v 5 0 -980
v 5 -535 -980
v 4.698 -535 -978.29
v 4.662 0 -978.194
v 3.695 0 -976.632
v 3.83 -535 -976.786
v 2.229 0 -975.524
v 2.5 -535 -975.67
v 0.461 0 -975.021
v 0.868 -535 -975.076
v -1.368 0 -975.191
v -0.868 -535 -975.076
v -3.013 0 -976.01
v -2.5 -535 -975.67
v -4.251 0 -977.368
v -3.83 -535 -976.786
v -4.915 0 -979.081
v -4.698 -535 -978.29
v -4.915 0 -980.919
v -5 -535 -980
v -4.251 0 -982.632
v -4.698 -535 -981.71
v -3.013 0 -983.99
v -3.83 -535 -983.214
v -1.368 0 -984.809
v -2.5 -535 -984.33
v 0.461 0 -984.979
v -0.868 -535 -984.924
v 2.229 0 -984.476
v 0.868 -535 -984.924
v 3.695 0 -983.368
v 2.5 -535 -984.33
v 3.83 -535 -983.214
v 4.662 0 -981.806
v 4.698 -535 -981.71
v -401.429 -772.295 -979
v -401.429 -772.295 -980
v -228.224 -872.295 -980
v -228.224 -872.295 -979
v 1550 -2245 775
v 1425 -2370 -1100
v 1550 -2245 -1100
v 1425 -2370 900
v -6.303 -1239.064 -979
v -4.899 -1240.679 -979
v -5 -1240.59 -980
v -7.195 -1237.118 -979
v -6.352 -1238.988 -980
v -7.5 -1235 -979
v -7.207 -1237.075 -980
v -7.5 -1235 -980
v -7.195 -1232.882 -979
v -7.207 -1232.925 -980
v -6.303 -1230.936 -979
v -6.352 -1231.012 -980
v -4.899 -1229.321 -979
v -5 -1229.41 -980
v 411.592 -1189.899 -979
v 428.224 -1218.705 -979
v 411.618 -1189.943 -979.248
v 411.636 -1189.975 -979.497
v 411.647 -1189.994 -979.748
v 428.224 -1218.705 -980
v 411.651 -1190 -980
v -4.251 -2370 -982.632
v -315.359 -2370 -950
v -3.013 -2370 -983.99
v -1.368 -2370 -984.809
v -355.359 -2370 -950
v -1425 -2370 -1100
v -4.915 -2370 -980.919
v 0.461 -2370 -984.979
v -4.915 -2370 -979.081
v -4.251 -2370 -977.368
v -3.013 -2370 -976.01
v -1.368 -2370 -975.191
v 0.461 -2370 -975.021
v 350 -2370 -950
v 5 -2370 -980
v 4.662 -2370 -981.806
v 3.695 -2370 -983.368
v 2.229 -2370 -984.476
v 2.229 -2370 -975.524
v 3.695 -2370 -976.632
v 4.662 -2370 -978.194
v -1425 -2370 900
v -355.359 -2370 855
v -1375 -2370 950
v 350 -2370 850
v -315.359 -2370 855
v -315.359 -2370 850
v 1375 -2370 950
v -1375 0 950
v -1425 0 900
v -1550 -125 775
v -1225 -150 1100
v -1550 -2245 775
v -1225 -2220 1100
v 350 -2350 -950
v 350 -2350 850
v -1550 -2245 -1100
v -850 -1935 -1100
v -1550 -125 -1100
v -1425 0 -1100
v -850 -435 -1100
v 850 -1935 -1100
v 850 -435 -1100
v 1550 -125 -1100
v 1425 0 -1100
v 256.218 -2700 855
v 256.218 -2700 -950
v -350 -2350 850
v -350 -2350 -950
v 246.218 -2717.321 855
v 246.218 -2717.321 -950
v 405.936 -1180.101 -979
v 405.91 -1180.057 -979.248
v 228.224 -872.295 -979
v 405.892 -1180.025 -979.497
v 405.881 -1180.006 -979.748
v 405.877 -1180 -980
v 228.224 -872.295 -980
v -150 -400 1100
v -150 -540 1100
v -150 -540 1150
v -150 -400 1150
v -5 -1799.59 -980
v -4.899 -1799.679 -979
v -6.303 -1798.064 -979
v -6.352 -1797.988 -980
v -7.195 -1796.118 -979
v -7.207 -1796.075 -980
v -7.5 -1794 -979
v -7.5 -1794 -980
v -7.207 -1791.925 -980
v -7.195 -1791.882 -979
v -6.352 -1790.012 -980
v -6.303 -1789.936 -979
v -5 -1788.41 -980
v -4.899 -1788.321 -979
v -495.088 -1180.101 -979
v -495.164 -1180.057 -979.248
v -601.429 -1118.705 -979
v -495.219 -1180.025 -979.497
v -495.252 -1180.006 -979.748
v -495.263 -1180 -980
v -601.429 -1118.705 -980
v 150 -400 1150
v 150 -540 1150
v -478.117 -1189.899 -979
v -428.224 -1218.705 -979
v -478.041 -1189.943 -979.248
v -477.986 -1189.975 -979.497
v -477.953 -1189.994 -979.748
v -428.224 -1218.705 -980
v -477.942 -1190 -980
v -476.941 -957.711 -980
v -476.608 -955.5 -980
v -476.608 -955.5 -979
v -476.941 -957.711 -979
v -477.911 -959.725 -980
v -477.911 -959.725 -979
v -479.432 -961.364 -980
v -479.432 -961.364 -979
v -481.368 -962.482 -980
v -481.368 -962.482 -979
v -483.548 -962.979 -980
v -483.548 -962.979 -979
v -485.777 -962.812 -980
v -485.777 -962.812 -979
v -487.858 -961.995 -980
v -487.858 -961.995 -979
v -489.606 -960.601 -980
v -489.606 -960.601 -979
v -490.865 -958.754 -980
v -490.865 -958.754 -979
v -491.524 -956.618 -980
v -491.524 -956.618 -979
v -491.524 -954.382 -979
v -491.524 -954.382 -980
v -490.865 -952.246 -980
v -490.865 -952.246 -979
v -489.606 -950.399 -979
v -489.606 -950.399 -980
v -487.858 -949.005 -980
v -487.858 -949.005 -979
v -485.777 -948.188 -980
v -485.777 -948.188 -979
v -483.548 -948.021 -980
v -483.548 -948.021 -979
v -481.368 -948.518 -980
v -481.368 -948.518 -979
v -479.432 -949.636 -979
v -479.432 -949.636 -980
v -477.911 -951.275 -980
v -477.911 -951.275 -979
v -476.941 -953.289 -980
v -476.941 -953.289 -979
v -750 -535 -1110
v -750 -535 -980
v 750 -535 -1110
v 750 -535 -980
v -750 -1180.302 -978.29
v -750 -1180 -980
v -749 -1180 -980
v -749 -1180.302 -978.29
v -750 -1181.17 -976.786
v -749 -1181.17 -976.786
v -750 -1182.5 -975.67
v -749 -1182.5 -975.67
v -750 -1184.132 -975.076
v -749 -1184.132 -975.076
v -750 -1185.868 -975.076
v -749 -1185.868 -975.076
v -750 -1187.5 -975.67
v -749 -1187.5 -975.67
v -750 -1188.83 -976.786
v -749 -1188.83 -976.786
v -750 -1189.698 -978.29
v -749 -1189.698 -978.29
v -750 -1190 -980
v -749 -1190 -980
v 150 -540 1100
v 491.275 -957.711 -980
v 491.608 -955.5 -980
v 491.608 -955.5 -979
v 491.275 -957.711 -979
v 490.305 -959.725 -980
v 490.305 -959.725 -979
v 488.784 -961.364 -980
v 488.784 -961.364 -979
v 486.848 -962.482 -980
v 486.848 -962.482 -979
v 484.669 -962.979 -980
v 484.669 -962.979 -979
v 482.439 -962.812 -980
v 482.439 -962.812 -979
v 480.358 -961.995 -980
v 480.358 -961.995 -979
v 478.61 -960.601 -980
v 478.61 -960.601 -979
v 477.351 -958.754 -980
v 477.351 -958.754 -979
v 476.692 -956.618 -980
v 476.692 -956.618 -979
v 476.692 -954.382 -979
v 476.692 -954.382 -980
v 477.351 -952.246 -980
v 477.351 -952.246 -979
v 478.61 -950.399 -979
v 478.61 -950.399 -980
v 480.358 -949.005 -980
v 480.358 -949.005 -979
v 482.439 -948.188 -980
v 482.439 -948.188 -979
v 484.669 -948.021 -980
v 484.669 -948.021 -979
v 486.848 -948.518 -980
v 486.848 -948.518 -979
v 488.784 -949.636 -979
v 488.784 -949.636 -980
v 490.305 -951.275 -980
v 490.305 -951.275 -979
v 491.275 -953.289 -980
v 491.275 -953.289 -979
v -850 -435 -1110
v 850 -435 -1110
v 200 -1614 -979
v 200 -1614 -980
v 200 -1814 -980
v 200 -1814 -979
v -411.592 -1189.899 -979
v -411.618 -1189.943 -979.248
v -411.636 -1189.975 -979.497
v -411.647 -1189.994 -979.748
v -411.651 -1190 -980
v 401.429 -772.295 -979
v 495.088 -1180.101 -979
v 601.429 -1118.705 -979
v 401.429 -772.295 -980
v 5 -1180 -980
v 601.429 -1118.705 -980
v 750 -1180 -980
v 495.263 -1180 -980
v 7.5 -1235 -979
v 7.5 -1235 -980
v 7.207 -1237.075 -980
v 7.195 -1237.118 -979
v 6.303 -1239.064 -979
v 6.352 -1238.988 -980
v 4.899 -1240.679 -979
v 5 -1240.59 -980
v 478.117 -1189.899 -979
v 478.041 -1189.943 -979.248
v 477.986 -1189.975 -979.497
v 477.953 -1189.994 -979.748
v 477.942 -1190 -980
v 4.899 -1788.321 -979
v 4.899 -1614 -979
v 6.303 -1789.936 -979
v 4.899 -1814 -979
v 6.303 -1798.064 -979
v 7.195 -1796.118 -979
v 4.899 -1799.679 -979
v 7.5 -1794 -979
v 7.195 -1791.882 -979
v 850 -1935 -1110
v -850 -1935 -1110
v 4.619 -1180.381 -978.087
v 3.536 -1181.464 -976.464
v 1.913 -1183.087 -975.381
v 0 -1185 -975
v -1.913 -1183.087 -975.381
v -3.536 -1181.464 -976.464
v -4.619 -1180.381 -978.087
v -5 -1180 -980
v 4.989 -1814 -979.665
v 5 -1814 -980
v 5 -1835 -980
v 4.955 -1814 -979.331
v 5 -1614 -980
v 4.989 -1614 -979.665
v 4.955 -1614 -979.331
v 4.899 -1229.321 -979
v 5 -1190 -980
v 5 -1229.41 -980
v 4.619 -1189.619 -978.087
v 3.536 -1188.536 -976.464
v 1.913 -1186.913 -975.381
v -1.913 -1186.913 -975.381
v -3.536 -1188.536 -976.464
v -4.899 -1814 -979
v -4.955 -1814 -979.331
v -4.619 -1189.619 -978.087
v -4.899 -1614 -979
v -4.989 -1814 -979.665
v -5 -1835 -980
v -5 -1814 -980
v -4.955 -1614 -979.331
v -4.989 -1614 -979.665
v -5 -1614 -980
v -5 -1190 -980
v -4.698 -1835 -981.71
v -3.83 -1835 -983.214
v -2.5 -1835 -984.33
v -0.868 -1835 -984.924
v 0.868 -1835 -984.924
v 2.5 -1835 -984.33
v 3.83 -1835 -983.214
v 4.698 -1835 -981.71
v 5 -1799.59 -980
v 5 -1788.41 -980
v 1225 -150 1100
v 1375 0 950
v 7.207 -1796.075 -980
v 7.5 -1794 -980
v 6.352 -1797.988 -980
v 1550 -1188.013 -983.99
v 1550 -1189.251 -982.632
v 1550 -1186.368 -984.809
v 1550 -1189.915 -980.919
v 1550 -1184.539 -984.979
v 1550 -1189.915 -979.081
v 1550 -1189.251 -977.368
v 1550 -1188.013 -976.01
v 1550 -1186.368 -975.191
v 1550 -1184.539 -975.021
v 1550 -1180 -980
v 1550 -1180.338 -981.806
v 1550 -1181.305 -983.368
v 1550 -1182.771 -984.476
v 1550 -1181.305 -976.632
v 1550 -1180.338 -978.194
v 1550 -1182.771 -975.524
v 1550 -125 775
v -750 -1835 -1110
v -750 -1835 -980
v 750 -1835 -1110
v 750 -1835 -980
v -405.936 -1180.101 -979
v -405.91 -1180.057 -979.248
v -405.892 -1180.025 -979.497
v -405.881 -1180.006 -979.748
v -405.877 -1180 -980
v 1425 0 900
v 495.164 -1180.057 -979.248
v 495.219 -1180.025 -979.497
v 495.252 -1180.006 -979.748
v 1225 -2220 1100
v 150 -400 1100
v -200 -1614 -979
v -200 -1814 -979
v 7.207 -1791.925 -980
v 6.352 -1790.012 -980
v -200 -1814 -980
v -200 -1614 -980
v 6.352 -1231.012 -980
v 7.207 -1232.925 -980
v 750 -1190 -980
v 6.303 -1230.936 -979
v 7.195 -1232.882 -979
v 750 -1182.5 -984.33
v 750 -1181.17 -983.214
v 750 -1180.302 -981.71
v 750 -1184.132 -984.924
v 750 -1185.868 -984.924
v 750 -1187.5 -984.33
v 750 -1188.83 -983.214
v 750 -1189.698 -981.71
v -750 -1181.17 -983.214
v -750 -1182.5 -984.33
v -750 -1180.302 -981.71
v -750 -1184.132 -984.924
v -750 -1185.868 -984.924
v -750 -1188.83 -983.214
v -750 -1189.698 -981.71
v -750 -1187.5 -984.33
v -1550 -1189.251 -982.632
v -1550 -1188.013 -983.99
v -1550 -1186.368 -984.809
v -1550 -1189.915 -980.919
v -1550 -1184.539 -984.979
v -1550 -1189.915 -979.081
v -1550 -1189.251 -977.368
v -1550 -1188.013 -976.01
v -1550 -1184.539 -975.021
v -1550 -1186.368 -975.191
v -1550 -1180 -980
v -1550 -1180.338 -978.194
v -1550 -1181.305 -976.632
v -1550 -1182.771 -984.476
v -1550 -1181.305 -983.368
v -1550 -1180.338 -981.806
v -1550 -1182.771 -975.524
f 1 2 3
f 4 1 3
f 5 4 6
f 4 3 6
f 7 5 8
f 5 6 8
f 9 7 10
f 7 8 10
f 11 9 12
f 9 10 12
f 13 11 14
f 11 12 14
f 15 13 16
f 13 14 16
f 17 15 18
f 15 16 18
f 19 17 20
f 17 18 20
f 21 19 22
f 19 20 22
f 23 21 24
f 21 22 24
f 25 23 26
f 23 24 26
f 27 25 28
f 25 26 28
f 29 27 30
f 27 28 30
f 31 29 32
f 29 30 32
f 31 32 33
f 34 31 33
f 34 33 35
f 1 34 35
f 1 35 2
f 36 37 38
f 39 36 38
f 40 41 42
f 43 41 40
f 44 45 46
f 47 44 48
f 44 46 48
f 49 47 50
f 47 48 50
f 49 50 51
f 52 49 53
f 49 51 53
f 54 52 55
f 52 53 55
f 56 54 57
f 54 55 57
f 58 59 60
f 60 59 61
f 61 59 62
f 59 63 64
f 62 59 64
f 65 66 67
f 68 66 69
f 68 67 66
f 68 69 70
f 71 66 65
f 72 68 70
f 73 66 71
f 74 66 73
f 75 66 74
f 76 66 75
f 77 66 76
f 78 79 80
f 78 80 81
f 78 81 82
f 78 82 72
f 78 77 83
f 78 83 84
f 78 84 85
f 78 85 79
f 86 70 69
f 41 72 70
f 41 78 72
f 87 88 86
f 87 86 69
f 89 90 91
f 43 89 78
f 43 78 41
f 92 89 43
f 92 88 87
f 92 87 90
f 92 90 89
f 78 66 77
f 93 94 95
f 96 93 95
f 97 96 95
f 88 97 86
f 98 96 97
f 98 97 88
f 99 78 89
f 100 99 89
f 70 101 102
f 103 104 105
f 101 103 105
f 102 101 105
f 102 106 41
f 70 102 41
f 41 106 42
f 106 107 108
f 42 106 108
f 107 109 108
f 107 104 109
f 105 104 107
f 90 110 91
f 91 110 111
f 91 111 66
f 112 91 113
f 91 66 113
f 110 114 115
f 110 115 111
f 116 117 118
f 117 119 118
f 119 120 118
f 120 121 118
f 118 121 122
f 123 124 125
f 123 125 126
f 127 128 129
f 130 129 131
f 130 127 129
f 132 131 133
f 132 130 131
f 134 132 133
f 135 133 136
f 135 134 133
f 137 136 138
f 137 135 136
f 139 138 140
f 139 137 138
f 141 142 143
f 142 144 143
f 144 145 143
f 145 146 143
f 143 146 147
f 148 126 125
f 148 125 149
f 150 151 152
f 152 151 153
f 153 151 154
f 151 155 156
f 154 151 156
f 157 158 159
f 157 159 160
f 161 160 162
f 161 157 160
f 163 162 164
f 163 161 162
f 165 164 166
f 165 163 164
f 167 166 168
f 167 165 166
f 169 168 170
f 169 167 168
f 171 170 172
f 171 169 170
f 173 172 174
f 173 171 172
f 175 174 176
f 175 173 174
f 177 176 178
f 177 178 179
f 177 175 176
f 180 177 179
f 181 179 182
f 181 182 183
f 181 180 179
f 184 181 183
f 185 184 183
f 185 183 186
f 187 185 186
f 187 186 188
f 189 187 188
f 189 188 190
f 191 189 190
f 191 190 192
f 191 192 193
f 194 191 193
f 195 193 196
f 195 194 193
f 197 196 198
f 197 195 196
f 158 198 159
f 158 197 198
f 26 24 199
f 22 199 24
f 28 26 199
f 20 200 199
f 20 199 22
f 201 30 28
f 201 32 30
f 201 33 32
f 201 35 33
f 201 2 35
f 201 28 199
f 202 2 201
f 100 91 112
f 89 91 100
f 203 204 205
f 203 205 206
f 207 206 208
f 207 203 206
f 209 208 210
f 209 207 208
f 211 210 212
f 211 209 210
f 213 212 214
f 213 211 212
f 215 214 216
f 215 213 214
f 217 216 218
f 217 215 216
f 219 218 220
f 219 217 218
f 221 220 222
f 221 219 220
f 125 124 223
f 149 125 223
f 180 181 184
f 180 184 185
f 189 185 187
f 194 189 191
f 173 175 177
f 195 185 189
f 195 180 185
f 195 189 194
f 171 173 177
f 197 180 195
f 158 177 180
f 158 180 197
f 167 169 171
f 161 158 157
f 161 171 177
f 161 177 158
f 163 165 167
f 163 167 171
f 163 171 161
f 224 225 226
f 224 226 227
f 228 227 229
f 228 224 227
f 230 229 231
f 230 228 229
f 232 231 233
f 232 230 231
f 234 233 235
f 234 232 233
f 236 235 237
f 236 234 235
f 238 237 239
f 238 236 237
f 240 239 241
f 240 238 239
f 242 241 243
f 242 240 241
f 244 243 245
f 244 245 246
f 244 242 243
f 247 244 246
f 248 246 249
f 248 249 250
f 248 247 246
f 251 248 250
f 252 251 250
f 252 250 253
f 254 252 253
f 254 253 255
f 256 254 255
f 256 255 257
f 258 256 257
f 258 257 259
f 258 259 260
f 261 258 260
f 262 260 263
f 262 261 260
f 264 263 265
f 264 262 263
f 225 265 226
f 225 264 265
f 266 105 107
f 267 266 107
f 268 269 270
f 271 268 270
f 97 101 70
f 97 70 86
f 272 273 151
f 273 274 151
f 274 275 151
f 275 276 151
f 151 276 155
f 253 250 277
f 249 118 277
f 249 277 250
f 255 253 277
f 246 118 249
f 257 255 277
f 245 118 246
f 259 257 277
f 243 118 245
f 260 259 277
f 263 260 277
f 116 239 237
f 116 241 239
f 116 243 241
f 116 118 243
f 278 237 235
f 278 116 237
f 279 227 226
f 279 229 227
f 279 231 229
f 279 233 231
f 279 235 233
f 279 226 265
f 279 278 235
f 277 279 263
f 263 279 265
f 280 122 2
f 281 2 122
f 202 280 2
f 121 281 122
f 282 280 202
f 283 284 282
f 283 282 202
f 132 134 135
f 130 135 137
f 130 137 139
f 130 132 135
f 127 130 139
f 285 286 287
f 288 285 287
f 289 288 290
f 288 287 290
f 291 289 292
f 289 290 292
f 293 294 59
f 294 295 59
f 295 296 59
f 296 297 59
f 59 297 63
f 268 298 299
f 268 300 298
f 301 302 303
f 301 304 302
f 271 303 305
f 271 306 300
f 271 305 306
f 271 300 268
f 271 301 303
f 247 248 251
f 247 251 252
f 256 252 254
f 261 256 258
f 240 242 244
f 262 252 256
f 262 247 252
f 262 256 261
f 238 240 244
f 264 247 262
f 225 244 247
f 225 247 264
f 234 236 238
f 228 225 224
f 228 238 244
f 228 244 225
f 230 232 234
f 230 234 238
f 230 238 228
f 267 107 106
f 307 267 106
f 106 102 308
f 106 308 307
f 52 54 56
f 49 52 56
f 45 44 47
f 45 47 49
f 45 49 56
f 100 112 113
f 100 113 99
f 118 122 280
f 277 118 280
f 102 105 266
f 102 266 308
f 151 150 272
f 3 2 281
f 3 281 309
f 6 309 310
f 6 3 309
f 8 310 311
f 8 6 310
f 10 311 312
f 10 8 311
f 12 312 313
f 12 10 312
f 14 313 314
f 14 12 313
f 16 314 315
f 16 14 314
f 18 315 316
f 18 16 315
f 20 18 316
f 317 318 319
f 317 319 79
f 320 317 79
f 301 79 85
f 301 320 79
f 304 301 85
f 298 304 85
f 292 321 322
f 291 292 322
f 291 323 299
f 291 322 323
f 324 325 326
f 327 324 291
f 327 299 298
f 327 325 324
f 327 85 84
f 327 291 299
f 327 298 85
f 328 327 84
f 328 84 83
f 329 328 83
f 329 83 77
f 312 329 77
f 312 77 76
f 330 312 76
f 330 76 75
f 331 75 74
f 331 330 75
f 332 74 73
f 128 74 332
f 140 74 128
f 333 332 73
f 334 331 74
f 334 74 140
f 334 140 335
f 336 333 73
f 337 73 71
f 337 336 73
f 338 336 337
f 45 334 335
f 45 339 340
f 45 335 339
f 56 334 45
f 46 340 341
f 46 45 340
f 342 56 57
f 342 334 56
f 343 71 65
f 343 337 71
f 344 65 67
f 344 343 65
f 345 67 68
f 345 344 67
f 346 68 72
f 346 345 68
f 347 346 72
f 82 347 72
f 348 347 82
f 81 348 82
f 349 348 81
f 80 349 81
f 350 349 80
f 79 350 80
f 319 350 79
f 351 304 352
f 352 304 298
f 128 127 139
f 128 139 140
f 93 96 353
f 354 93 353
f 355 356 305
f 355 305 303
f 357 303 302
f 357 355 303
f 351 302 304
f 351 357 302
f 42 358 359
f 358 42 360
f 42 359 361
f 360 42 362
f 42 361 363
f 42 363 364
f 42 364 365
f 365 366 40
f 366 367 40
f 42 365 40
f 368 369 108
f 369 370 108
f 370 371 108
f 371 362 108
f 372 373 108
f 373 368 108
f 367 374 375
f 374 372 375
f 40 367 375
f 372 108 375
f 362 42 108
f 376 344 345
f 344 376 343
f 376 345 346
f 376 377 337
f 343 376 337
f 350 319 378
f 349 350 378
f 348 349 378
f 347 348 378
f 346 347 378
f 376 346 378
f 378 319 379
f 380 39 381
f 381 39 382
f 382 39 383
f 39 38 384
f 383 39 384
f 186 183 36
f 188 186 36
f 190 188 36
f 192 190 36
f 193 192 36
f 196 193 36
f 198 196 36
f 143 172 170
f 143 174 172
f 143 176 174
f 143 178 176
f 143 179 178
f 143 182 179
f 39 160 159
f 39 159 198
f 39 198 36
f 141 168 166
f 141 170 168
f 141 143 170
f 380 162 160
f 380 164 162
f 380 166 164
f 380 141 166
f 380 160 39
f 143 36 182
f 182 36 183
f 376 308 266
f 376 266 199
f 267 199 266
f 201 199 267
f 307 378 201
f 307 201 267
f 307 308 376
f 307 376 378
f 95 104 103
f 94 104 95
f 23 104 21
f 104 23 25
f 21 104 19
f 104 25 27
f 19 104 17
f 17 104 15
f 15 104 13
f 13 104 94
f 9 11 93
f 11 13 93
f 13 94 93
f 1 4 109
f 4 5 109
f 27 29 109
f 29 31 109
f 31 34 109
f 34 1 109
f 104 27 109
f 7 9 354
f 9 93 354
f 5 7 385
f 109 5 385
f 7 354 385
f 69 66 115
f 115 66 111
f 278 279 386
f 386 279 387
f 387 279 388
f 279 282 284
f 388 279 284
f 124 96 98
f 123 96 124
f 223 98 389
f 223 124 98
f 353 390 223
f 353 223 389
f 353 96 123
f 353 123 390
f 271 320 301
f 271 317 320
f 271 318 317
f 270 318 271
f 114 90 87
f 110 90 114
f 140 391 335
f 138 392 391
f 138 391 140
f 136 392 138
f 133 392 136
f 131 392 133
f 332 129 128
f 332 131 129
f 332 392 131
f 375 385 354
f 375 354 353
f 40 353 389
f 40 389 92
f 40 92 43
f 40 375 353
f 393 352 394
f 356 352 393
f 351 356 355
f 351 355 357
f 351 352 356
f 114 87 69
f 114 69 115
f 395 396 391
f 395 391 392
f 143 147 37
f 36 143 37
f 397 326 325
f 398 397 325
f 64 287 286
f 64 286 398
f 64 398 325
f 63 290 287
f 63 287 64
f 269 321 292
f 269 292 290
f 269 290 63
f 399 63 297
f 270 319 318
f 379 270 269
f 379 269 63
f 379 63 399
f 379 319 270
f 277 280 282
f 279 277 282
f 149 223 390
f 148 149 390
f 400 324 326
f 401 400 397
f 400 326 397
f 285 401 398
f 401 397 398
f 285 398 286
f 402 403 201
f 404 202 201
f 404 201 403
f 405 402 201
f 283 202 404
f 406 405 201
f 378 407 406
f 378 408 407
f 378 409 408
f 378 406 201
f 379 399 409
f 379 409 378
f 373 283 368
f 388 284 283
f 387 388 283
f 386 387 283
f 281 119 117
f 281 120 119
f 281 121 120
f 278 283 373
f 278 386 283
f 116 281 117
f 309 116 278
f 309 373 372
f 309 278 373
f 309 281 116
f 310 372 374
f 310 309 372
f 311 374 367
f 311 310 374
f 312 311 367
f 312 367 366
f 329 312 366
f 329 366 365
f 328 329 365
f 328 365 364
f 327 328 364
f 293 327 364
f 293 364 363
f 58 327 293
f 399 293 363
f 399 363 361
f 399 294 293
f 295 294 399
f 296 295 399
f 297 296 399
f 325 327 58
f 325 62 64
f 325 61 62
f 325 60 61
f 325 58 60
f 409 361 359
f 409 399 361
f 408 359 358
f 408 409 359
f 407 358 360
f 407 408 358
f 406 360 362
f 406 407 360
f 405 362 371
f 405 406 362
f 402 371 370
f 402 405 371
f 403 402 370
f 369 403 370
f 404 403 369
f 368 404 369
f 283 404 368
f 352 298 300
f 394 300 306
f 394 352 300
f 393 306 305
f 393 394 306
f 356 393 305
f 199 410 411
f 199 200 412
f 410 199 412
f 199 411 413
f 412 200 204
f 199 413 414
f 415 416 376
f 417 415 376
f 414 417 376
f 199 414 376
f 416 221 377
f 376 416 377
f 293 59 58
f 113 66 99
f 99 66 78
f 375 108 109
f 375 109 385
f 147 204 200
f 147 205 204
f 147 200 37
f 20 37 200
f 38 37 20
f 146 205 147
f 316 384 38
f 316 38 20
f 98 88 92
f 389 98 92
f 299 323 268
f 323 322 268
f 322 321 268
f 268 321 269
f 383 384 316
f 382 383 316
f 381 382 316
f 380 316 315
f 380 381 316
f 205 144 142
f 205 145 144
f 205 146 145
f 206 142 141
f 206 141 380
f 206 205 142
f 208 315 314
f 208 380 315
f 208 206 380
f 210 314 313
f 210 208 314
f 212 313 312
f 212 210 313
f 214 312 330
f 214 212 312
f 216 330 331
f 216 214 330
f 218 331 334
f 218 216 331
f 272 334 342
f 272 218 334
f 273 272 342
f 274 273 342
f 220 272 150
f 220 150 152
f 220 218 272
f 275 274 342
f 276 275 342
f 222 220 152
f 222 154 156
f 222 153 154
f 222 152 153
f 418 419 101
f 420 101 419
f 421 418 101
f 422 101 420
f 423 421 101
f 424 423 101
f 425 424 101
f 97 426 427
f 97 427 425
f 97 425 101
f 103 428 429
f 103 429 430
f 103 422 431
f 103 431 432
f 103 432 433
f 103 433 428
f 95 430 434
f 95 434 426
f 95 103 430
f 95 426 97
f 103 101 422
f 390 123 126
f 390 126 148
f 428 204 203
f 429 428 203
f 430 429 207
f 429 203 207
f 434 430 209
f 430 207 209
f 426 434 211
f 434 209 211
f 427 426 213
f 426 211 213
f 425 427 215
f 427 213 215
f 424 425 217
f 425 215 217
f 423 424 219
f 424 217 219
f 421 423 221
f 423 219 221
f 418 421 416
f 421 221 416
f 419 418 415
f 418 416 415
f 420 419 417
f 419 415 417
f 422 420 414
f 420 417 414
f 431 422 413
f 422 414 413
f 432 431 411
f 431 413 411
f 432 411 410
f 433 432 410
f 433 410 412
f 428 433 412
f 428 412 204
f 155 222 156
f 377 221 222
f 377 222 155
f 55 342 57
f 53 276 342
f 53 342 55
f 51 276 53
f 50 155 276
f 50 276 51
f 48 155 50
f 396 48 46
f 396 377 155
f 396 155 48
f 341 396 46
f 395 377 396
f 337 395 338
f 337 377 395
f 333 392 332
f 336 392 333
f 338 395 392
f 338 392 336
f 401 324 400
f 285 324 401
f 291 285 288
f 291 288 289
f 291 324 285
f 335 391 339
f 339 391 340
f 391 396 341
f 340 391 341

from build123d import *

# Parameters (mm, degrees)
F0_W           = 3100
F0_H           = 2200
F1_DEPTH       = 2370
F2_SIZE        = 325
F3_SIZE        = 325
F4_SIZE        = 125
F5_SIZE        = 125
F6_SIZE        = 125
F7_SIZE        = 125
F8_W           = 1500
F8_H           = 1300
F9_DEPTH       = 120
F10_W          = 400
F10_H          = 200
F10_R          = 7.5
F11_DEPTH      = 1
F12_R          = 5
F13_DEPTH      = 1
F14_DEPTH      = 800.001
F14_DEPTH_BACK = 2300.001
F15_R          = 5
F16_DEPTH      = 535.001
F16_DEPTH_BACK = 1835.001
F17_SIZE       = 150
F18_SIZE       = 150
F19_W          = 1700
F19_H          = 1500
F19_W_2        = 1500
F19_H_2        = 1300
F20_DEPTH      = 10
F21_W          = 700
F21_H          = 1800
F22_DEPTH      = 20
F23_W          = 300
F23_H          = 140
F24_DEPTH      = 50
F26_DEPTH      = 1805


# Not quite as in the source:
# - a feature of the source that left no trace in its solid (it failed there, or was rolled back) is left out


with BuildPart() as f1:
    # F0 (on Front) → F1 (new body)
    with BuildSketch(Plane.XZ):
        Rectangle(F0_W, F0_H)
    extrude(amount=F1_DEPTH)

    # F2
    f2_edges = [f1.edges().sort_by_distance(p)[0] for p in [
        (-1550, -1185, 1100),
    ]]
    chamfer(f2_edges, length=F2_SIZE)

    # F3
    f3_edges = [f1.edges().sort_by_distance(p)[0] for p in [
        (1550, -1185, 1100),
    ]]
    chamfer(f3_edges, length=F3_SIZE)

    # F4
    f4_edges = [f1.edges().sort_by_distance(p)[0] for p in [
        (1550, -2370, -162.5),
    ]]
    chamfer(f4_edges, length=F4_SIZE)

    # F5
    f5_edges = [f1.edges().sort_by_distance(p)[0] for p in [
        (-1550, -2370, -162.5),
    ]]
    chamfer(f5_edges, length=F5_SIZE)

    # F6
    f6_edges = [f1.edges().sort_by_distance(p)[0] for p in [
        (-1550, 0, -162.5),
    ]]
    chamfer(f6_edges, length=F6_SIZE)

    # F7
    f7_edges = [f1.edges().sort_by_distance(p)[0] for p in [
        (1550, 0, -162.5),
    ]]
    chamfer(f7_edges, length=F7_SIZE)

    # F8 (on face) → F9 (cut)
    with BuildSketch(Plane(origin=(0, 0, -1100), x_dir=(1, 0, 0), z_dir=(0, 0, -1))):
        with Locations((0, 1185)):
            Rectangle(F8_W, F8_H)
    extrude(amount=-F9_DEPTH, mode=Mode.SUBTRACT)

    # F10 (on face) → F11 (cut)
    with BuildSketch(Plane(origin=(0, 0, -980), x_dir=(1, 0, 0), z_dir=(0, 0, -1))):
        with Locations((0, 1714)):
            Rectangle(F10_W, F10_H)
        with Locations((0, 1794)):
            Circle(F10_R, mode=Mode.SUBTRACT)
        Polygon((601.4287087912, 1118.7050807569), (428.2236280343, 1218.7050807569), (228.2236280343, 872.2949192431), (401.4287087912, 772.2949192431), align=None)
        with Locations((484.1082007155, 955.5)):
            Circle(F10_R, mode=Mode.SUBTRACT)
        Polygon((-228.2236280343, 872.2949192431), (-428.2236280343, 1218.7050807569), (-601.4287087912, 1118.7050807569), (-401.4287087912, 772.2949192431), align=None)
        with Locations((-484.1082007155, 955.5)):
            Circle(F10_R, mode=Mode.SUBTRACT)
        with Locations((0, 1235)):
            Circle(F10_R)
    extrude(amount=-F11_DEPTH, mode=Mode.SUBTRACT)

    # F12 (on face) → F13 (cut)
    with BuildSketch(Plane.YZ.offset(-750)):
        with Locations((-1185, -980)):
            Circle(F12_R)
    extrude(amount=F13_DEPTH, mode=Mode.SUBTRACT)

    # F12 (on face) → F14 (cut, two sides)
    with BuildSketch(Plane.YZ.offset(-750)) as f14_sk:
        with Locations((-1185, -980)):
            Circle(F12_R)
    extrude(amount=-F14_DEPTH, mode=Mode.SUBTRACT)
    extrude(f14_sk.sketch, amount=F14_DEPTH_BACK, mode=Mode.SUBTRACT)

    # F15 (on face) → F16 (cut, two sides)
    with BuildSketch(Plane.XZ.offset(535)) as f16_sk:
        with Locations((0, -980)):
            Circle(F15_R)
    extrude(amount=-F16_DEPTH, mode=Mode.SUBTRACT)
    extrude(f16_sk.sketch, amount=F16_DEPTH_BACK, mode=Mode.SUBTRACT)

    # F17
    f17_edges = [f1.edges().sort_by_distance(p)[0] for p in [
        (0, 0, 1100),
    ]]
    chamfer(f17_edges, length=F17_SIZE)

    # F18
    f18_edges = [f1.edges().sort_by_distance(p)[0] for p in [
        (0, -2370, 1100),
    ]]
    chamfer(f18_edges, length=F18_SIZE)

    # F19 (on face) → F20 (join)
    with BuildSketch(Plane(origin=(0, 0, -1100), x_dir=(1, 0, 0), z_dir=(0, 0, -1))):
        with Locations((0, 1185)):
            Rectangle(F19_W, F19_H)
        with Locations((0, 1185)):
            Rectangle(F19_W_2, F19_H_2, mode=Mode.SUBTRACT)
    extrude(amount=F20_DEPTH)

    # F21 (on face) → F22 (cut)
    with BuildSketch(Plane.XZ.offset(2370)):
        with Locations((0, -50)):
            Rectangle(F21_W, F21_H)
    extrude(amount=-F22_DEPTH, mode=Mode.SUBTRACT)

    # F23 (on face) → F24 (join)
    with BuildSketch(Plane.XY.offset(1100)):
        with Locations((0, -470)):
            Rectangle(F23_W, F23_H)
    extrude(amount=F24_DEPTH)

    # F25 (on face) → F26 (join)
    with BuildSketch(Plane.XY.offset(-950)):
        Polygon((-350, -2350), (-360, -2367.3205080757), (246.2177826491, -2717.3205080757), (256.2177826491, -2700), align=None)
    extrude(amount=F26_DEPTH)


solid = f1.part
